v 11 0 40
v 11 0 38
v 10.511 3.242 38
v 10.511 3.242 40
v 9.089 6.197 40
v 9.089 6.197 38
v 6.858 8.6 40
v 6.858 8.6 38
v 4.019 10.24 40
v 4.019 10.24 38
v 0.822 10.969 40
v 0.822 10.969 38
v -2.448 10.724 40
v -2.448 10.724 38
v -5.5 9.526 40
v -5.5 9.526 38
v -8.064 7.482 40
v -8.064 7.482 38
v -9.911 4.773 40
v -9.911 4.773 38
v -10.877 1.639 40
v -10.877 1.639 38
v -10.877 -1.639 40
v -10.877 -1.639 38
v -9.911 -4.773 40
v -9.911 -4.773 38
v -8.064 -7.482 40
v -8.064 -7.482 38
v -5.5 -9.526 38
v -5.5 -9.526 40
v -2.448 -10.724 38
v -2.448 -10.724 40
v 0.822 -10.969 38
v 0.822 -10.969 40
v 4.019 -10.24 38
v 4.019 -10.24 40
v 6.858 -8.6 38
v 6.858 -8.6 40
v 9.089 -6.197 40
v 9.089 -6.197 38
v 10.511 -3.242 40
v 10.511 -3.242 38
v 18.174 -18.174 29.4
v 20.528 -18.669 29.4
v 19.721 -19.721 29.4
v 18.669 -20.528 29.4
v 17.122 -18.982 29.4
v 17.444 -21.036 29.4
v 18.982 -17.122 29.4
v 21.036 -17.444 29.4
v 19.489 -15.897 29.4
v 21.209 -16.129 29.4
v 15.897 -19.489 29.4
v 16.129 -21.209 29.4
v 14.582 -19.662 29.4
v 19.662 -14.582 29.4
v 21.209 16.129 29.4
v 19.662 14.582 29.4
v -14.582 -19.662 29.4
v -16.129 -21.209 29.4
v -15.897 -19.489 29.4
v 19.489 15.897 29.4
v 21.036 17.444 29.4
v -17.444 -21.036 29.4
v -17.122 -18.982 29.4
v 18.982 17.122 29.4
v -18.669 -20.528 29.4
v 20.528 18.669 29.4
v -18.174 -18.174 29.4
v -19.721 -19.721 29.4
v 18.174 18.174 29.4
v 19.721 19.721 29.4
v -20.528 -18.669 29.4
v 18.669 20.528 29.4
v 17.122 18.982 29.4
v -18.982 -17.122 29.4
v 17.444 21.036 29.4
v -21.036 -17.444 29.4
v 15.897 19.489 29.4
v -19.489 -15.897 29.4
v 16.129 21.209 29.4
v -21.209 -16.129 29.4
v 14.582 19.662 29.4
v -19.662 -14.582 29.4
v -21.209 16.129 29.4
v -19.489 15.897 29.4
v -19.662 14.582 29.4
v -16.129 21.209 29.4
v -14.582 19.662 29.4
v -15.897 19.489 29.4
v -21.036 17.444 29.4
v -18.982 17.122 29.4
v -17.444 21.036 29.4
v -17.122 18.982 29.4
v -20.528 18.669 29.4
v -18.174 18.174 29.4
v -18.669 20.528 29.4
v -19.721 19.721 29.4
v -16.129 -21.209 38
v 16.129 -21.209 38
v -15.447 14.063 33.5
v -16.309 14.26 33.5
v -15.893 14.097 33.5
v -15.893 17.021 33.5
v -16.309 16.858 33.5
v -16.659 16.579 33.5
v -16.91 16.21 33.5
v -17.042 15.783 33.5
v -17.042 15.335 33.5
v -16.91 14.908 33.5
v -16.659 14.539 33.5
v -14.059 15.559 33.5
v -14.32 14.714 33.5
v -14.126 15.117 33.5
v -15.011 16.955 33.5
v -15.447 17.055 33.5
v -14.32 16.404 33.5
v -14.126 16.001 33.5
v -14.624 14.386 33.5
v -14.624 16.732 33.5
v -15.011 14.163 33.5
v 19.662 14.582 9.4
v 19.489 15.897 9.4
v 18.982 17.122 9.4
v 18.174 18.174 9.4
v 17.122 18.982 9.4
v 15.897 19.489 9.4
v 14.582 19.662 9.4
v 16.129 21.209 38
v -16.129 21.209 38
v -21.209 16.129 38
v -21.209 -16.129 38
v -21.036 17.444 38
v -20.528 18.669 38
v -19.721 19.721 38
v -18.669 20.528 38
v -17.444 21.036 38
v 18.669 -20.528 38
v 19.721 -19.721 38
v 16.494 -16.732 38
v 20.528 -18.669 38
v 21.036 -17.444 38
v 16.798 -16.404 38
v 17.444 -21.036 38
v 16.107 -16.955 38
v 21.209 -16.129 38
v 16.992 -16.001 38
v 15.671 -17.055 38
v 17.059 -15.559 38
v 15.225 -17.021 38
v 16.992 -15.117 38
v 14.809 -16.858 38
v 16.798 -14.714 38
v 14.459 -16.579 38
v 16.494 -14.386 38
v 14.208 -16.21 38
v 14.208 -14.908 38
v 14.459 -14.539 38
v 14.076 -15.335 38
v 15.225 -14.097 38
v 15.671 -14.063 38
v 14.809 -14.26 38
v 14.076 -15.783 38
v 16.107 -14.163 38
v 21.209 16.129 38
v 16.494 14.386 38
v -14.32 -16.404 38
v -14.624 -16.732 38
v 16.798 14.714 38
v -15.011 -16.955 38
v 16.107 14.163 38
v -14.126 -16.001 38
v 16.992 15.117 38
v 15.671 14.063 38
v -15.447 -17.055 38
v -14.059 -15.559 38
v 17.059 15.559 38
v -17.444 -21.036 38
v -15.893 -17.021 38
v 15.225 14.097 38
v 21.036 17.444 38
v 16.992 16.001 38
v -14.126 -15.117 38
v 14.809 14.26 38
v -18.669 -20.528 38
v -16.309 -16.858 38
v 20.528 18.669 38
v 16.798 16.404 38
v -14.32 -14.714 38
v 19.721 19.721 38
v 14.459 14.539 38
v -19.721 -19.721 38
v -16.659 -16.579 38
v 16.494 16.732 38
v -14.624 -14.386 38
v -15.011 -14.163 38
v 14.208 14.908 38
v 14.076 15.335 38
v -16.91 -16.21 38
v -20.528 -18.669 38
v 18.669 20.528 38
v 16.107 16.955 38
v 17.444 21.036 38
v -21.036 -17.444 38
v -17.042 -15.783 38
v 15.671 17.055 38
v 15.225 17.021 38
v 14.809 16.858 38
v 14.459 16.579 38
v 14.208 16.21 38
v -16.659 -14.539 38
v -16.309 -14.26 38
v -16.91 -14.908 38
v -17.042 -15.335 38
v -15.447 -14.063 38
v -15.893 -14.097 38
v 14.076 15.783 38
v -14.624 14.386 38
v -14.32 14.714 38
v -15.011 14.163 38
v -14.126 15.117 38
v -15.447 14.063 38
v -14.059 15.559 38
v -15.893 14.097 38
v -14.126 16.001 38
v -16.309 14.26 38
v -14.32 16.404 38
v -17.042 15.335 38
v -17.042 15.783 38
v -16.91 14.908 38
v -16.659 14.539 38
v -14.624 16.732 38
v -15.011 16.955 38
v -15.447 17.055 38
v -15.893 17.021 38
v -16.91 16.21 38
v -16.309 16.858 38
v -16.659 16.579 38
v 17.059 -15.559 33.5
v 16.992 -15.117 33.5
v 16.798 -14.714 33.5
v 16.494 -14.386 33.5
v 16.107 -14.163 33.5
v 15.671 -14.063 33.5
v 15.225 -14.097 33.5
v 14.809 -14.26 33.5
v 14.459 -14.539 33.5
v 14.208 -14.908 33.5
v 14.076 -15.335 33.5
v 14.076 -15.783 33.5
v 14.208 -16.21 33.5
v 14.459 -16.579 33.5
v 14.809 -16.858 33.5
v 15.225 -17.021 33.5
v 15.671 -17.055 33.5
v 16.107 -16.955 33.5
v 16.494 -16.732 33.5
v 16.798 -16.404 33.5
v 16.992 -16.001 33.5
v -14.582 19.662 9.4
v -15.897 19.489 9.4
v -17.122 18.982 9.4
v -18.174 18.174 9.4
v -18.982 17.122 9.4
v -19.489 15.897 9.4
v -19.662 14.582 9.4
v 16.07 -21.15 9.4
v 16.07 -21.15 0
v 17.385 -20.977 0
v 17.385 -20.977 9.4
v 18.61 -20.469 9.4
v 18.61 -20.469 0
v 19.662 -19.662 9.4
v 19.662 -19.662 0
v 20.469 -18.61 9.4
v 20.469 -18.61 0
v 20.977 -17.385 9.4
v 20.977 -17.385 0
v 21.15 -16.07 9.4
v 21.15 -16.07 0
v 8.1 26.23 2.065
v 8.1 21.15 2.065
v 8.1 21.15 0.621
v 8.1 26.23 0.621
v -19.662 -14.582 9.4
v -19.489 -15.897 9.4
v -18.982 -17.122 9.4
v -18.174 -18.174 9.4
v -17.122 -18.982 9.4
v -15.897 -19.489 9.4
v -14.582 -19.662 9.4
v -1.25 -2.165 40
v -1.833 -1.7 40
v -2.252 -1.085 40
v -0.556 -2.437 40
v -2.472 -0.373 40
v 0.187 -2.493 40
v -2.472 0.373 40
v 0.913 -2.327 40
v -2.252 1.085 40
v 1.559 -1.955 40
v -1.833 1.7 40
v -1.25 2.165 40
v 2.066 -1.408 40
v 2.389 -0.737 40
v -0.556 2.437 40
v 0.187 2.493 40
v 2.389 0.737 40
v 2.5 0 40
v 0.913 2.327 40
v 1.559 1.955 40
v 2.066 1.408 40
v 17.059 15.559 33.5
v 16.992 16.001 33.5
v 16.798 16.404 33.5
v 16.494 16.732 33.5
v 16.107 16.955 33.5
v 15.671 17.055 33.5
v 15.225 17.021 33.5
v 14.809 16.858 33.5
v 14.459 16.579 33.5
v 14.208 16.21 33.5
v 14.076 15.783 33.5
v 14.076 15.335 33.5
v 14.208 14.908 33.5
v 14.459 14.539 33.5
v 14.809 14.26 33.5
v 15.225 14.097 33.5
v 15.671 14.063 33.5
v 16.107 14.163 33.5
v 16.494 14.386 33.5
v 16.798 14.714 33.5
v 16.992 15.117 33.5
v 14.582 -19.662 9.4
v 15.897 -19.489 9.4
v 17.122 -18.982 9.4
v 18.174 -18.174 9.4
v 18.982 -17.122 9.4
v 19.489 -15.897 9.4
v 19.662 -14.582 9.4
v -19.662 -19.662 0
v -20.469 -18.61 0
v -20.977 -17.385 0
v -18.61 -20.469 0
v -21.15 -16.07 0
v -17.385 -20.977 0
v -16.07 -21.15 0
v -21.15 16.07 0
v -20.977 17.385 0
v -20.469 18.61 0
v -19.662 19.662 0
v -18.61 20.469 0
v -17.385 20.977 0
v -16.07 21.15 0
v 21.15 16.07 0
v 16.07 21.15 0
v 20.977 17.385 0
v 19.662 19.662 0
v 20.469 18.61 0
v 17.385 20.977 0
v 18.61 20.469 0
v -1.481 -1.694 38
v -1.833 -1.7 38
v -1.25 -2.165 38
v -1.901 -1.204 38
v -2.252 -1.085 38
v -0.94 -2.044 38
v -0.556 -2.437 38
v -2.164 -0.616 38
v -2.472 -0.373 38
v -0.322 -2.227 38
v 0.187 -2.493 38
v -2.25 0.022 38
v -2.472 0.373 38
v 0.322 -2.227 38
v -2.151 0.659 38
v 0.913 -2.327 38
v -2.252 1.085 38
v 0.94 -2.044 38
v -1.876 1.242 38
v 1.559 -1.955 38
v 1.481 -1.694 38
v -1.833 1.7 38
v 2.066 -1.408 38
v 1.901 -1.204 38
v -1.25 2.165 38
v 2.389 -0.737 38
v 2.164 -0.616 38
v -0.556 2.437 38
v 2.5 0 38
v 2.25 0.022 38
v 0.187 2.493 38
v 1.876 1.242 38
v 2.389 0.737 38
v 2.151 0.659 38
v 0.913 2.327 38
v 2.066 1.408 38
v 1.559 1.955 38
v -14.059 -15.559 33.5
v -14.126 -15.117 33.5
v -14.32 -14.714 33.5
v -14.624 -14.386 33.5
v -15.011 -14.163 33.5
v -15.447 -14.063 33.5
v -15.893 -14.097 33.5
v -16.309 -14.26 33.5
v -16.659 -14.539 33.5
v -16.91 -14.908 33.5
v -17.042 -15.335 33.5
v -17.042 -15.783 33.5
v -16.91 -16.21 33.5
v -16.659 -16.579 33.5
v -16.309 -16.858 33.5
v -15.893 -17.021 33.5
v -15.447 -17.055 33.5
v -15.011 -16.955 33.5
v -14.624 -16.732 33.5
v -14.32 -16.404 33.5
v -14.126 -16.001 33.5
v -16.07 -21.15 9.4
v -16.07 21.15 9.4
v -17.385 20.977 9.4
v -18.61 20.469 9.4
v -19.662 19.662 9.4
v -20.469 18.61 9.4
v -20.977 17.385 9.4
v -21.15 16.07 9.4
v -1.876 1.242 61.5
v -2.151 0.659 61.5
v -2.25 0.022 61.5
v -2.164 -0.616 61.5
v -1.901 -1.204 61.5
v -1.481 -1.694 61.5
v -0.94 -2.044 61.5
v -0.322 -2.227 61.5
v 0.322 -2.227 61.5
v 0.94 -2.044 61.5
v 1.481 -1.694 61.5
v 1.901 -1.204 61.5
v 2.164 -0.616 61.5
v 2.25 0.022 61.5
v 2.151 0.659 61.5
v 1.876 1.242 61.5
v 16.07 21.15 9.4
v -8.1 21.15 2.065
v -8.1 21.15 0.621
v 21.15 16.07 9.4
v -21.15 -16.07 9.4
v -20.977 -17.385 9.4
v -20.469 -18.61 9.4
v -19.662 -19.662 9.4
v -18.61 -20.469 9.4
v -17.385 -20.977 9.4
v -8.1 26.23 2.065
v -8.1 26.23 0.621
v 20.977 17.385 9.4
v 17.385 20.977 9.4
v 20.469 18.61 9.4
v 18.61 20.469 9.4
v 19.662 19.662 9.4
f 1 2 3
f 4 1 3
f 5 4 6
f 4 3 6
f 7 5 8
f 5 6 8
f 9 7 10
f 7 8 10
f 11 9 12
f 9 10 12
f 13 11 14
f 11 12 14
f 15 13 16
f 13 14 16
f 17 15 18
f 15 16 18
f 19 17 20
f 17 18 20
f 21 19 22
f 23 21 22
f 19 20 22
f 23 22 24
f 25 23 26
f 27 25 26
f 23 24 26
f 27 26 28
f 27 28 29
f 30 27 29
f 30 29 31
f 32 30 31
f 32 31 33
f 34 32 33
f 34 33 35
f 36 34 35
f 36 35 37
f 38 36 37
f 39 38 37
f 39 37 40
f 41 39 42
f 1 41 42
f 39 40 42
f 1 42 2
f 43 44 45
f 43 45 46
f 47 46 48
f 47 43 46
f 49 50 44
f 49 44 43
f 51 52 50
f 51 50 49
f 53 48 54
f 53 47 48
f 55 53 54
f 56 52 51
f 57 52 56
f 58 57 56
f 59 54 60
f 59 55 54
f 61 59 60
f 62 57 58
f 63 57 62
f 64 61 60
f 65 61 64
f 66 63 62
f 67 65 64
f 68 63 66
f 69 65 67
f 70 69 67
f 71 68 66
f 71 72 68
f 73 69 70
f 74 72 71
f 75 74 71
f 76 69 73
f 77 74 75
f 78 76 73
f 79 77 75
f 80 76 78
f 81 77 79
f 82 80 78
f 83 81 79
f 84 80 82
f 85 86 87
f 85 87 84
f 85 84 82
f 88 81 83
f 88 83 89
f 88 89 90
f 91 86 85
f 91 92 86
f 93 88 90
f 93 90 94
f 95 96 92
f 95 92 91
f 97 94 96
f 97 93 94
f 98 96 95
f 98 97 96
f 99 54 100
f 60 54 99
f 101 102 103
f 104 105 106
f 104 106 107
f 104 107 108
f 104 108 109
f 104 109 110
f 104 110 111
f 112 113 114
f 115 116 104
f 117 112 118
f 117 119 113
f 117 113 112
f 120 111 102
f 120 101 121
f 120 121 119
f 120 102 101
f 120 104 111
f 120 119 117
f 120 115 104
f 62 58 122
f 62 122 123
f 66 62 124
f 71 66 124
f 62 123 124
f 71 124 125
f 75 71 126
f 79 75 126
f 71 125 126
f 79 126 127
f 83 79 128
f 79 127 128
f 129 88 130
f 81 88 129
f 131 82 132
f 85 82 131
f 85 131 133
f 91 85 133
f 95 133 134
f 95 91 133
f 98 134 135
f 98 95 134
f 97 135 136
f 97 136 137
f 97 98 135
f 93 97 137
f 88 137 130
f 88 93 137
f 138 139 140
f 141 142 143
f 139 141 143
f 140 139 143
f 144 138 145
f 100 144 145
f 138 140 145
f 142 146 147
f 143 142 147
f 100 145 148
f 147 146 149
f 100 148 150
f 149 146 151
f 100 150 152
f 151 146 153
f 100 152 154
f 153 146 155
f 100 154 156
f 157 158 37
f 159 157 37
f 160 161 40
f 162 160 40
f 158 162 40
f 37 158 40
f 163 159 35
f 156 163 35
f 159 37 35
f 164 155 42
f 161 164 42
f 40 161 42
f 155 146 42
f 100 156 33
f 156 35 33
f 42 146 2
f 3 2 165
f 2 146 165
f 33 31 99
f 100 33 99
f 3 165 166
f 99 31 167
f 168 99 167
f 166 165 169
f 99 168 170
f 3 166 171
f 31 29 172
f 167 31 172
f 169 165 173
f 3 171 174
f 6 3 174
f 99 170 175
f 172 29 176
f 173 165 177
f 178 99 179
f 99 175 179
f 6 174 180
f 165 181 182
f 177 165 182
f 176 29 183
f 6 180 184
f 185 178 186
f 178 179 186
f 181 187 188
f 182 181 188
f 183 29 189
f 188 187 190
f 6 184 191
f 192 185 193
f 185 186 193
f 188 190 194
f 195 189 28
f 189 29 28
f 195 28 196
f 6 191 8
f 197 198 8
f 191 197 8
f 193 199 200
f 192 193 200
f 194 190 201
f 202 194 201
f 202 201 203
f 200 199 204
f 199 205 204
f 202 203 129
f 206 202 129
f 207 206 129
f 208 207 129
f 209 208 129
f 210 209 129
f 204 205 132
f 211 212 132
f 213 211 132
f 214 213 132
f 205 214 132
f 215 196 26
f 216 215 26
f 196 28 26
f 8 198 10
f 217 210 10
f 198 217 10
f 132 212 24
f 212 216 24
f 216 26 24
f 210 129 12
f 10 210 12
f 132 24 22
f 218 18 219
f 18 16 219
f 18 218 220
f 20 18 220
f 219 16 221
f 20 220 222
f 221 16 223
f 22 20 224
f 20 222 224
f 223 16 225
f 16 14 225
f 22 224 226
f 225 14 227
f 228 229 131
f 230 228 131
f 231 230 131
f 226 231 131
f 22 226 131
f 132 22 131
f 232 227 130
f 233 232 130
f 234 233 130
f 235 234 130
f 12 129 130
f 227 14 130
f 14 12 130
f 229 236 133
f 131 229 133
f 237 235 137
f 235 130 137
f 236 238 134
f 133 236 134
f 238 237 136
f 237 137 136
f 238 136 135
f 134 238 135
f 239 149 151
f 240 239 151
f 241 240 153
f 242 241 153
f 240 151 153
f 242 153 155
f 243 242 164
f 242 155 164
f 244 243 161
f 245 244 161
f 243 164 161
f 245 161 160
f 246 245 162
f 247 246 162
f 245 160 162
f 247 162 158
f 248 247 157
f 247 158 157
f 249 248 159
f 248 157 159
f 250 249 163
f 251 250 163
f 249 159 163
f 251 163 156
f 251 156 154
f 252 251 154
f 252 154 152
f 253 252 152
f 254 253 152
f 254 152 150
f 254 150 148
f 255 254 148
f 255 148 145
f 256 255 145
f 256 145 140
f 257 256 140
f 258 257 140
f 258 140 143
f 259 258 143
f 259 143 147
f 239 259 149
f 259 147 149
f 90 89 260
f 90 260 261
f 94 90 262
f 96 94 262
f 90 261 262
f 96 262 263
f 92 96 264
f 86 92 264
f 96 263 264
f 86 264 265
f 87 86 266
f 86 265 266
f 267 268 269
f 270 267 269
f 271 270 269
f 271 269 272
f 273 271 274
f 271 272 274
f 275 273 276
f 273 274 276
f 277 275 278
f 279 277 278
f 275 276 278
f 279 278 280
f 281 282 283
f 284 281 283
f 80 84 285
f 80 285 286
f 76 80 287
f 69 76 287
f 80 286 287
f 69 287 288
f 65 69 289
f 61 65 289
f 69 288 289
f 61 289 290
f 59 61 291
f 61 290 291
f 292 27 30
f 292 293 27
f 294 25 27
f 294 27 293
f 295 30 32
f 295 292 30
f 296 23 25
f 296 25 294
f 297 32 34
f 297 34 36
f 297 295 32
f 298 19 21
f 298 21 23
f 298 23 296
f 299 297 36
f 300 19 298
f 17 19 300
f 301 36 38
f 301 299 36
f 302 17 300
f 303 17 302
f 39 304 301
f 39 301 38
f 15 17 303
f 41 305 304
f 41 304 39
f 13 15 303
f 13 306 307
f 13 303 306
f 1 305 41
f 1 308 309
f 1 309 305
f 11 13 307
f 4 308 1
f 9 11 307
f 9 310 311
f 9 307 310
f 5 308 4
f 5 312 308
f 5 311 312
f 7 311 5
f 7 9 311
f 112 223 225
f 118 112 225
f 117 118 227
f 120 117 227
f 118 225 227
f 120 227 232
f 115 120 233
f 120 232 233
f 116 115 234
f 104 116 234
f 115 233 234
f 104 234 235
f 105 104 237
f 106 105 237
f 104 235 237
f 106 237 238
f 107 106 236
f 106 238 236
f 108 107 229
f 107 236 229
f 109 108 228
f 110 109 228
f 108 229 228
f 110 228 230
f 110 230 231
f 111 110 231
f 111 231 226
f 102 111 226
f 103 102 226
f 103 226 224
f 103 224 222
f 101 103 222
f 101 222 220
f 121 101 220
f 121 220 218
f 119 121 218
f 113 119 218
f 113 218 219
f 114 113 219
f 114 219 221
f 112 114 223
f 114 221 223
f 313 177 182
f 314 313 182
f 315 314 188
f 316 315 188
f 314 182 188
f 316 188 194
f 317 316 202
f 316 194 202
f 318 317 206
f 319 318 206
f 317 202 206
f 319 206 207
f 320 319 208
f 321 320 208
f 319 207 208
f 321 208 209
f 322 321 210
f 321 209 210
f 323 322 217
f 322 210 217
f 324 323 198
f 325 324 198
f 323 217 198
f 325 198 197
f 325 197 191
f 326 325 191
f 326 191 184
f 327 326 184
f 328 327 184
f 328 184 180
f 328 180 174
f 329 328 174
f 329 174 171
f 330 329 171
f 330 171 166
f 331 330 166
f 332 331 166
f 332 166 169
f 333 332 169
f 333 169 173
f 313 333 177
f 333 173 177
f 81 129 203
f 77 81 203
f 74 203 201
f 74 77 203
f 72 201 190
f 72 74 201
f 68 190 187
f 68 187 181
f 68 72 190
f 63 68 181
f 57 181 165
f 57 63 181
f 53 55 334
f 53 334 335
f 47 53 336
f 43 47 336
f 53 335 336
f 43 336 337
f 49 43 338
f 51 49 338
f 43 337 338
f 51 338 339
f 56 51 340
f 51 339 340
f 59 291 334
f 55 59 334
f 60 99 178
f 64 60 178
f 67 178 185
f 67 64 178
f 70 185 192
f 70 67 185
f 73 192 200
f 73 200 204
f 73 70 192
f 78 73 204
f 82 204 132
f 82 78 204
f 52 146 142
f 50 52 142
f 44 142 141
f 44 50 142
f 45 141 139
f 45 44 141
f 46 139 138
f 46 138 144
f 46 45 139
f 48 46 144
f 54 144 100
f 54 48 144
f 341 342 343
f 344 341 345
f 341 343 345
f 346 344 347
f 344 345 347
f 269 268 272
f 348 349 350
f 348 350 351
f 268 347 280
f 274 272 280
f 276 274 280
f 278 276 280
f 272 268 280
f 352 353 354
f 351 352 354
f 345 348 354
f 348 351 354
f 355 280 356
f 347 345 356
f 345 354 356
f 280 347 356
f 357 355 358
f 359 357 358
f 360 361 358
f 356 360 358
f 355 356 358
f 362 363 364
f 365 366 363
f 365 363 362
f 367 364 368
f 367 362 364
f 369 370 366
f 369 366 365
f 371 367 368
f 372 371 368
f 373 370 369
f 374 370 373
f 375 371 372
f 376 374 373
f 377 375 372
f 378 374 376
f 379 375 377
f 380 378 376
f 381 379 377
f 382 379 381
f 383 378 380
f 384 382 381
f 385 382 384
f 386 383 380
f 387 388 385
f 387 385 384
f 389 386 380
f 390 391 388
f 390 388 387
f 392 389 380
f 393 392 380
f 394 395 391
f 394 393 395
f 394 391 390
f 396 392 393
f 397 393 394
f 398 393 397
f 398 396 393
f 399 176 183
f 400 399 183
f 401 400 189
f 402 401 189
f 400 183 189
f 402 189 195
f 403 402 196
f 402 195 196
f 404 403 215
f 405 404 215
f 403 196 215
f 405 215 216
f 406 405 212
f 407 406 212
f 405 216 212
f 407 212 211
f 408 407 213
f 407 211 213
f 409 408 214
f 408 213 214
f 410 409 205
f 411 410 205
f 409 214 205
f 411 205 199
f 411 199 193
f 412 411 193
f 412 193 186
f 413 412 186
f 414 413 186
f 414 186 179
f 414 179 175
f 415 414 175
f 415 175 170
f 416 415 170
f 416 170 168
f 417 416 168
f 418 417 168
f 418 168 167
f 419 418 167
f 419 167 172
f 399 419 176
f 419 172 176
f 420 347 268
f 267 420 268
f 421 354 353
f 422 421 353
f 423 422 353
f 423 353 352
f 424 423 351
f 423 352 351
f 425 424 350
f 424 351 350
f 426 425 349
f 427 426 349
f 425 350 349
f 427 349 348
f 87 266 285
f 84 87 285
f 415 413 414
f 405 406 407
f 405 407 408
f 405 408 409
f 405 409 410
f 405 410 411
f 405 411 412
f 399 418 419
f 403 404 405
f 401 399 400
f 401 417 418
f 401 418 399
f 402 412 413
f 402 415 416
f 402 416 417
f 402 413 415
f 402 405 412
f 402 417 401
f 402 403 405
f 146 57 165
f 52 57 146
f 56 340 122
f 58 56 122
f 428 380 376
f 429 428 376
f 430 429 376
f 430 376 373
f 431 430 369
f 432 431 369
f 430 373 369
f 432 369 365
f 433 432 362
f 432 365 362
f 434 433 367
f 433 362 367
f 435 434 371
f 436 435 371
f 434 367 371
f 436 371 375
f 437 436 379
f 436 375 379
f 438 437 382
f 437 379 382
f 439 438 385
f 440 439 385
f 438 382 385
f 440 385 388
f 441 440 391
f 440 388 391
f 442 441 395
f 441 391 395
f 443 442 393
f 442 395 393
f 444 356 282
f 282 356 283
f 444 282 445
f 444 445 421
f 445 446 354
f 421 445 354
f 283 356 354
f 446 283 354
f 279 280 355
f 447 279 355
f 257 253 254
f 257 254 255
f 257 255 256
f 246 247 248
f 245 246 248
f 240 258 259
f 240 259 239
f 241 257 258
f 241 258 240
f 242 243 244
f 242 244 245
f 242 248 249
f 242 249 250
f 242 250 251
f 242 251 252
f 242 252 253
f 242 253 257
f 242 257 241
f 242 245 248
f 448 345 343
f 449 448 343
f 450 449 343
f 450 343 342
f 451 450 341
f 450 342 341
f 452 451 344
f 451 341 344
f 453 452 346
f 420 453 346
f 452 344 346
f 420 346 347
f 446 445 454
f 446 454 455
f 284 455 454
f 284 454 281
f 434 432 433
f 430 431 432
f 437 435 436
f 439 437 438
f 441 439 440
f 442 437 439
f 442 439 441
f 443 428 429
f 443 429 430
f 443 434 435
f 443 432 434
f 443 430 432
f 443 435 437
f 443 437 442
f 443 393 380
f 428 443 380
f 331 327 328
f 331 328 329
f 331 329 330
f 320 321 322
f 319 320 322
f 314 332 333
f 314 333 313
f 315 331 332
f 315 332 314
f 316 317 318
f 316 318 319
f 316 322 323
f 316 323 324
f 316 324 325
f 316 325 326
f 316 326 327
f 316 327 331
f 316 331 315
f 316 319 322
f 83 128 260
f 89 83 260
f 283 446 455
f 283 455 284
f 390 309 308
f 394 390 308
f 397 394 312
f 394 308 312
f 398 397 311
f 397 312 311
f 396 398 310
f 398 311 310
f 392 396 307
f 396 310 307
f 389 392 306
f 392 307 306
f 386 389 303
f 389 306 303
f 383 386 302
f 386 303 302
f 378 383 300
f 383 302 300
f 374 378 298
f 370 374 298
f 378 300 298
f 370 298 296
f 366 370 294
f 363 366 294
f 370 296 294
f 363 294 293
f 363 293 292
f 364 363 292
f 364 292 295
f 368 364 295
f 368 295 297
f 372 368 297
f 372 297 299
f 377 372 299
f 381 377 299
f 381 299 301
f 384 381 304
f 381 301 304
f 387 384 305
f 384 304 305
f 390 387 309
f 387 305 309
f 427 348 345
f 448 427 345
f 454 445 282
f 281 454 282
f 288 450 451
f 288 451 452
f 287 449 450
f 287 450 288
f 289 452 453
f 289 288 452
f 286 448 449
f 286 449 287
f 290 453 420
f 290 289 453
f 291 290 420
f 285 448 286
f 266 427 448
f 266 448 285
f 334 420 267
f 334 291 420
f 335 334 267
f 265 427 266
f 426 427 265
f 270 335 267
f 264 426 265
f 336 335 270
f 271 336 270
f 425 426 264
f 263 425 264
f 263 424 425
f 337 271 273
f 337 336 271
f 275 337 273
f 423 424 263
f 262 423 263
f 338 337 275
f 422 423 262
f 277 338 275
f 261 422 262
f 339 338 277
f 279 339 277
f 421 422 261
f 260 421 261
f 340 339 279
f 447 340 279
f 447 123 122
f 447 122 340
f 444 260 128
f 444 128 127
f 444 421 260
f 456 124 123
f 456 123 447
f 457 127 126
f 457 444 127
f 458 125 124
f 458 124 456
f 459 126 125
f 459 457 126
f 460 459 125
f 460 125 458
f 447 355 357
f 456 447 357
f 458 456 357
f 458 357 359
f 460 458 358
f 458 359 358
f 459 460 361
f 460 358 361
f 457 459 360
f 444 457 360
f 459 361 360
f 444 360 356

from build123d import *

# Parameters (mm, degrees)
BOSS_EXTRUDE1_DEPTH = 9.4
BOSS_EXTRUDE2_DEPTH = 20
BOSS_EXTRUDE4_DEPTH = 8.6
SKETCH5_R           = 11
BOSS_EXTRUDE5_DEPTH = 2
SKETCH6_R           = 2.5
CUT_EXTRUDE1_DEPTH  = 2
BOSS_EXTRUDE6_DEPTH = 23.5
SKETCH8_W           = 16.2
SKETCH8_H           = 1.444611315
BOSS_EXTRUDE7_DEPTH = 5.08
SKETCH9_R           = 1.5
CUT_EXTRUDE2_DEPTH  = 4.5


with BuildPart() as part:
    # Sketch1 → Boss-Extrude1 (new body)
    with BuildSketch(Plane.XY):
        with BuildLine():
            Line((-16.07, -21.15), (16.07, -21.15))
            ThreePointArc((16.07, -21.15), (19.662102448, -19.662102448), (21.15, -16.07))
            Line((21.15, -16.07), (21.15, 16.07))
            ThreePointArc((21.15, 16.07), (19.662102448, 19.662102448), (16.07, 21.15))
            Line((16.07, 21.15), (-16.07, 21.15))
            ThreePointArc((-16.07, 21.15), (-19.662102448, 19.662102448), (-21.15, 16.07))
            Line((-21.15, 16.07), (-21.15, -16.07))
            ThreePointArc((-21.15, -16.07), (-19.662102448, -19.662102448), (-16.07, -21.15))
        make_face()
    extrude(amount=BOSS_EXTRUDE1_DEPTH)

    # Sketch2 → Boss-Extrude2 (add)
    with BuildSketch(Plane.XY.offset(9.4)):
        with BuildLine():
            Line((-14.582102448, -19.662102448), (14.582102448, -19.662102448))
            ThreePointArc((14.582102448, -19.662102448), (18.174204897, -18.174204897), (19.662102448, -14.582102448))
            Line((19.662102448, -14.582102448), (19.662102448, 14.582102448))
            ThreePointArc((19.662102448, 14.582102448), (18.174204897, 18.174204897), (14.582102448, 19.662102448))
            Line((14.582102448, 19.662102448), (-14.582102448, 19.662102448))
            ThreePointArc((-14.582102448, 19.662102448), (-18.174204897, 18.174204897), (-19.662102448, 14.582102448))
            Line((-19.662102448, 14.582102448), (-19.662102448, -14.582102448))
            ThreePointArc((-19.662102448, -14.582102448), (-18.174204897, -18.174204897), (-14.582102448, -19.662102448))
        make_face()
    extrude(amount=BOSS_EXTRUDE2_DEPTH)

    # Sketch4 → Boss-Extrude4 (add)
    with BuildSketch(Plane.XY.offset(29.4)):
        with BuildLine():
            Line((16.129, -21.209), (-16.129, -21.209))
            ThreePointArc((-16.129, -21.209), (-19.721102448, -19.721102448), (-21.209, -16.129))
            Line((-21.209, -16.129), (-21.209, 16.129))
            ThreePointArc((-21.209, 16.129), (-19.721102448, 19.721102448), (-16.129, 21.209))
            Line((-16.129, 21.209), (16.129, 21.209))
            ThreePointArc((16.129, 21.209), (19.721102448, 19.721102448), (21.209, 16.129))
            Line((21.209, 16.129), (21.209, -16.129))
            ThreePointArc((21.209, -16.129), (19.721102448, -19.721102448), (16.129, -21.209))
        make_face()
    extrude(amount=BOSS_EXTRUDE4_DEPTH)

    # Sketch5 → Boss-Extrude5 (add)
    with BuildSketch(Plane.XY.offset(38)):
        Circle(SKETCH5_R)
    extrude(amount=BOSS_EXTRUDE5_DEPTH)

    # Sketch6 → Cut-Extrude1 (cut)
    with BuildSketch(Plane.XY.offset(40)):
        Circle(SKETCH6_R)
    extrude(amount=-CUT_EXTRUDE1_DEPTH, mode=Mode.SUBTRACT)

    # Sketch7 → Boss-Extrude6 (add)
    with BuildSketch(Plane.XY.offset(38)):
        with BuildLine():
            Line((1.876071115, 1.242118018), (-1.876071115, 1.242118018))
            ThreePointArc((-1.876071115, 1.242118018), (0, -2.25), (1.876071115, 1.242118018))
        make_face()
    extrude(amount=BOSS_EXTRUDE6_DEPTH)

    # Sketch8 → Boss-Extrude7 (add)
    with BuildSketch(Plane(origin=(0, 21.15, 0), x_dir=(1, 0, 0), z_dir=(0, 1, 0))):
        with Locations((0, -1.343147685)):
            Rectangle(SKETCH8_W, SKETCH8_H)
    extrude(amount=BOSS_EXTRUDE7_DEPTH)

    # Sketch9 → Cut-Extrude2 (cut)
    with BuildSketch(Plane.XY.offset(38)):
        with Locations((-15.559, 15.559)):
            Circle(SKETCH9_R)
        with Locations((15.559, 15.559)):
            Circle(SKETCH9_R)
        with Locations((15.559, -15.559)):
            Circle(SKETCH9_R)
        with Locations((-15.559, -15.559)):
            Circle(SKETCH9_R)
    extrude(amount=-CUT_EXTRUDE2_DEPTH, mode=Mode.SUBTRACT)


solid = part.part
